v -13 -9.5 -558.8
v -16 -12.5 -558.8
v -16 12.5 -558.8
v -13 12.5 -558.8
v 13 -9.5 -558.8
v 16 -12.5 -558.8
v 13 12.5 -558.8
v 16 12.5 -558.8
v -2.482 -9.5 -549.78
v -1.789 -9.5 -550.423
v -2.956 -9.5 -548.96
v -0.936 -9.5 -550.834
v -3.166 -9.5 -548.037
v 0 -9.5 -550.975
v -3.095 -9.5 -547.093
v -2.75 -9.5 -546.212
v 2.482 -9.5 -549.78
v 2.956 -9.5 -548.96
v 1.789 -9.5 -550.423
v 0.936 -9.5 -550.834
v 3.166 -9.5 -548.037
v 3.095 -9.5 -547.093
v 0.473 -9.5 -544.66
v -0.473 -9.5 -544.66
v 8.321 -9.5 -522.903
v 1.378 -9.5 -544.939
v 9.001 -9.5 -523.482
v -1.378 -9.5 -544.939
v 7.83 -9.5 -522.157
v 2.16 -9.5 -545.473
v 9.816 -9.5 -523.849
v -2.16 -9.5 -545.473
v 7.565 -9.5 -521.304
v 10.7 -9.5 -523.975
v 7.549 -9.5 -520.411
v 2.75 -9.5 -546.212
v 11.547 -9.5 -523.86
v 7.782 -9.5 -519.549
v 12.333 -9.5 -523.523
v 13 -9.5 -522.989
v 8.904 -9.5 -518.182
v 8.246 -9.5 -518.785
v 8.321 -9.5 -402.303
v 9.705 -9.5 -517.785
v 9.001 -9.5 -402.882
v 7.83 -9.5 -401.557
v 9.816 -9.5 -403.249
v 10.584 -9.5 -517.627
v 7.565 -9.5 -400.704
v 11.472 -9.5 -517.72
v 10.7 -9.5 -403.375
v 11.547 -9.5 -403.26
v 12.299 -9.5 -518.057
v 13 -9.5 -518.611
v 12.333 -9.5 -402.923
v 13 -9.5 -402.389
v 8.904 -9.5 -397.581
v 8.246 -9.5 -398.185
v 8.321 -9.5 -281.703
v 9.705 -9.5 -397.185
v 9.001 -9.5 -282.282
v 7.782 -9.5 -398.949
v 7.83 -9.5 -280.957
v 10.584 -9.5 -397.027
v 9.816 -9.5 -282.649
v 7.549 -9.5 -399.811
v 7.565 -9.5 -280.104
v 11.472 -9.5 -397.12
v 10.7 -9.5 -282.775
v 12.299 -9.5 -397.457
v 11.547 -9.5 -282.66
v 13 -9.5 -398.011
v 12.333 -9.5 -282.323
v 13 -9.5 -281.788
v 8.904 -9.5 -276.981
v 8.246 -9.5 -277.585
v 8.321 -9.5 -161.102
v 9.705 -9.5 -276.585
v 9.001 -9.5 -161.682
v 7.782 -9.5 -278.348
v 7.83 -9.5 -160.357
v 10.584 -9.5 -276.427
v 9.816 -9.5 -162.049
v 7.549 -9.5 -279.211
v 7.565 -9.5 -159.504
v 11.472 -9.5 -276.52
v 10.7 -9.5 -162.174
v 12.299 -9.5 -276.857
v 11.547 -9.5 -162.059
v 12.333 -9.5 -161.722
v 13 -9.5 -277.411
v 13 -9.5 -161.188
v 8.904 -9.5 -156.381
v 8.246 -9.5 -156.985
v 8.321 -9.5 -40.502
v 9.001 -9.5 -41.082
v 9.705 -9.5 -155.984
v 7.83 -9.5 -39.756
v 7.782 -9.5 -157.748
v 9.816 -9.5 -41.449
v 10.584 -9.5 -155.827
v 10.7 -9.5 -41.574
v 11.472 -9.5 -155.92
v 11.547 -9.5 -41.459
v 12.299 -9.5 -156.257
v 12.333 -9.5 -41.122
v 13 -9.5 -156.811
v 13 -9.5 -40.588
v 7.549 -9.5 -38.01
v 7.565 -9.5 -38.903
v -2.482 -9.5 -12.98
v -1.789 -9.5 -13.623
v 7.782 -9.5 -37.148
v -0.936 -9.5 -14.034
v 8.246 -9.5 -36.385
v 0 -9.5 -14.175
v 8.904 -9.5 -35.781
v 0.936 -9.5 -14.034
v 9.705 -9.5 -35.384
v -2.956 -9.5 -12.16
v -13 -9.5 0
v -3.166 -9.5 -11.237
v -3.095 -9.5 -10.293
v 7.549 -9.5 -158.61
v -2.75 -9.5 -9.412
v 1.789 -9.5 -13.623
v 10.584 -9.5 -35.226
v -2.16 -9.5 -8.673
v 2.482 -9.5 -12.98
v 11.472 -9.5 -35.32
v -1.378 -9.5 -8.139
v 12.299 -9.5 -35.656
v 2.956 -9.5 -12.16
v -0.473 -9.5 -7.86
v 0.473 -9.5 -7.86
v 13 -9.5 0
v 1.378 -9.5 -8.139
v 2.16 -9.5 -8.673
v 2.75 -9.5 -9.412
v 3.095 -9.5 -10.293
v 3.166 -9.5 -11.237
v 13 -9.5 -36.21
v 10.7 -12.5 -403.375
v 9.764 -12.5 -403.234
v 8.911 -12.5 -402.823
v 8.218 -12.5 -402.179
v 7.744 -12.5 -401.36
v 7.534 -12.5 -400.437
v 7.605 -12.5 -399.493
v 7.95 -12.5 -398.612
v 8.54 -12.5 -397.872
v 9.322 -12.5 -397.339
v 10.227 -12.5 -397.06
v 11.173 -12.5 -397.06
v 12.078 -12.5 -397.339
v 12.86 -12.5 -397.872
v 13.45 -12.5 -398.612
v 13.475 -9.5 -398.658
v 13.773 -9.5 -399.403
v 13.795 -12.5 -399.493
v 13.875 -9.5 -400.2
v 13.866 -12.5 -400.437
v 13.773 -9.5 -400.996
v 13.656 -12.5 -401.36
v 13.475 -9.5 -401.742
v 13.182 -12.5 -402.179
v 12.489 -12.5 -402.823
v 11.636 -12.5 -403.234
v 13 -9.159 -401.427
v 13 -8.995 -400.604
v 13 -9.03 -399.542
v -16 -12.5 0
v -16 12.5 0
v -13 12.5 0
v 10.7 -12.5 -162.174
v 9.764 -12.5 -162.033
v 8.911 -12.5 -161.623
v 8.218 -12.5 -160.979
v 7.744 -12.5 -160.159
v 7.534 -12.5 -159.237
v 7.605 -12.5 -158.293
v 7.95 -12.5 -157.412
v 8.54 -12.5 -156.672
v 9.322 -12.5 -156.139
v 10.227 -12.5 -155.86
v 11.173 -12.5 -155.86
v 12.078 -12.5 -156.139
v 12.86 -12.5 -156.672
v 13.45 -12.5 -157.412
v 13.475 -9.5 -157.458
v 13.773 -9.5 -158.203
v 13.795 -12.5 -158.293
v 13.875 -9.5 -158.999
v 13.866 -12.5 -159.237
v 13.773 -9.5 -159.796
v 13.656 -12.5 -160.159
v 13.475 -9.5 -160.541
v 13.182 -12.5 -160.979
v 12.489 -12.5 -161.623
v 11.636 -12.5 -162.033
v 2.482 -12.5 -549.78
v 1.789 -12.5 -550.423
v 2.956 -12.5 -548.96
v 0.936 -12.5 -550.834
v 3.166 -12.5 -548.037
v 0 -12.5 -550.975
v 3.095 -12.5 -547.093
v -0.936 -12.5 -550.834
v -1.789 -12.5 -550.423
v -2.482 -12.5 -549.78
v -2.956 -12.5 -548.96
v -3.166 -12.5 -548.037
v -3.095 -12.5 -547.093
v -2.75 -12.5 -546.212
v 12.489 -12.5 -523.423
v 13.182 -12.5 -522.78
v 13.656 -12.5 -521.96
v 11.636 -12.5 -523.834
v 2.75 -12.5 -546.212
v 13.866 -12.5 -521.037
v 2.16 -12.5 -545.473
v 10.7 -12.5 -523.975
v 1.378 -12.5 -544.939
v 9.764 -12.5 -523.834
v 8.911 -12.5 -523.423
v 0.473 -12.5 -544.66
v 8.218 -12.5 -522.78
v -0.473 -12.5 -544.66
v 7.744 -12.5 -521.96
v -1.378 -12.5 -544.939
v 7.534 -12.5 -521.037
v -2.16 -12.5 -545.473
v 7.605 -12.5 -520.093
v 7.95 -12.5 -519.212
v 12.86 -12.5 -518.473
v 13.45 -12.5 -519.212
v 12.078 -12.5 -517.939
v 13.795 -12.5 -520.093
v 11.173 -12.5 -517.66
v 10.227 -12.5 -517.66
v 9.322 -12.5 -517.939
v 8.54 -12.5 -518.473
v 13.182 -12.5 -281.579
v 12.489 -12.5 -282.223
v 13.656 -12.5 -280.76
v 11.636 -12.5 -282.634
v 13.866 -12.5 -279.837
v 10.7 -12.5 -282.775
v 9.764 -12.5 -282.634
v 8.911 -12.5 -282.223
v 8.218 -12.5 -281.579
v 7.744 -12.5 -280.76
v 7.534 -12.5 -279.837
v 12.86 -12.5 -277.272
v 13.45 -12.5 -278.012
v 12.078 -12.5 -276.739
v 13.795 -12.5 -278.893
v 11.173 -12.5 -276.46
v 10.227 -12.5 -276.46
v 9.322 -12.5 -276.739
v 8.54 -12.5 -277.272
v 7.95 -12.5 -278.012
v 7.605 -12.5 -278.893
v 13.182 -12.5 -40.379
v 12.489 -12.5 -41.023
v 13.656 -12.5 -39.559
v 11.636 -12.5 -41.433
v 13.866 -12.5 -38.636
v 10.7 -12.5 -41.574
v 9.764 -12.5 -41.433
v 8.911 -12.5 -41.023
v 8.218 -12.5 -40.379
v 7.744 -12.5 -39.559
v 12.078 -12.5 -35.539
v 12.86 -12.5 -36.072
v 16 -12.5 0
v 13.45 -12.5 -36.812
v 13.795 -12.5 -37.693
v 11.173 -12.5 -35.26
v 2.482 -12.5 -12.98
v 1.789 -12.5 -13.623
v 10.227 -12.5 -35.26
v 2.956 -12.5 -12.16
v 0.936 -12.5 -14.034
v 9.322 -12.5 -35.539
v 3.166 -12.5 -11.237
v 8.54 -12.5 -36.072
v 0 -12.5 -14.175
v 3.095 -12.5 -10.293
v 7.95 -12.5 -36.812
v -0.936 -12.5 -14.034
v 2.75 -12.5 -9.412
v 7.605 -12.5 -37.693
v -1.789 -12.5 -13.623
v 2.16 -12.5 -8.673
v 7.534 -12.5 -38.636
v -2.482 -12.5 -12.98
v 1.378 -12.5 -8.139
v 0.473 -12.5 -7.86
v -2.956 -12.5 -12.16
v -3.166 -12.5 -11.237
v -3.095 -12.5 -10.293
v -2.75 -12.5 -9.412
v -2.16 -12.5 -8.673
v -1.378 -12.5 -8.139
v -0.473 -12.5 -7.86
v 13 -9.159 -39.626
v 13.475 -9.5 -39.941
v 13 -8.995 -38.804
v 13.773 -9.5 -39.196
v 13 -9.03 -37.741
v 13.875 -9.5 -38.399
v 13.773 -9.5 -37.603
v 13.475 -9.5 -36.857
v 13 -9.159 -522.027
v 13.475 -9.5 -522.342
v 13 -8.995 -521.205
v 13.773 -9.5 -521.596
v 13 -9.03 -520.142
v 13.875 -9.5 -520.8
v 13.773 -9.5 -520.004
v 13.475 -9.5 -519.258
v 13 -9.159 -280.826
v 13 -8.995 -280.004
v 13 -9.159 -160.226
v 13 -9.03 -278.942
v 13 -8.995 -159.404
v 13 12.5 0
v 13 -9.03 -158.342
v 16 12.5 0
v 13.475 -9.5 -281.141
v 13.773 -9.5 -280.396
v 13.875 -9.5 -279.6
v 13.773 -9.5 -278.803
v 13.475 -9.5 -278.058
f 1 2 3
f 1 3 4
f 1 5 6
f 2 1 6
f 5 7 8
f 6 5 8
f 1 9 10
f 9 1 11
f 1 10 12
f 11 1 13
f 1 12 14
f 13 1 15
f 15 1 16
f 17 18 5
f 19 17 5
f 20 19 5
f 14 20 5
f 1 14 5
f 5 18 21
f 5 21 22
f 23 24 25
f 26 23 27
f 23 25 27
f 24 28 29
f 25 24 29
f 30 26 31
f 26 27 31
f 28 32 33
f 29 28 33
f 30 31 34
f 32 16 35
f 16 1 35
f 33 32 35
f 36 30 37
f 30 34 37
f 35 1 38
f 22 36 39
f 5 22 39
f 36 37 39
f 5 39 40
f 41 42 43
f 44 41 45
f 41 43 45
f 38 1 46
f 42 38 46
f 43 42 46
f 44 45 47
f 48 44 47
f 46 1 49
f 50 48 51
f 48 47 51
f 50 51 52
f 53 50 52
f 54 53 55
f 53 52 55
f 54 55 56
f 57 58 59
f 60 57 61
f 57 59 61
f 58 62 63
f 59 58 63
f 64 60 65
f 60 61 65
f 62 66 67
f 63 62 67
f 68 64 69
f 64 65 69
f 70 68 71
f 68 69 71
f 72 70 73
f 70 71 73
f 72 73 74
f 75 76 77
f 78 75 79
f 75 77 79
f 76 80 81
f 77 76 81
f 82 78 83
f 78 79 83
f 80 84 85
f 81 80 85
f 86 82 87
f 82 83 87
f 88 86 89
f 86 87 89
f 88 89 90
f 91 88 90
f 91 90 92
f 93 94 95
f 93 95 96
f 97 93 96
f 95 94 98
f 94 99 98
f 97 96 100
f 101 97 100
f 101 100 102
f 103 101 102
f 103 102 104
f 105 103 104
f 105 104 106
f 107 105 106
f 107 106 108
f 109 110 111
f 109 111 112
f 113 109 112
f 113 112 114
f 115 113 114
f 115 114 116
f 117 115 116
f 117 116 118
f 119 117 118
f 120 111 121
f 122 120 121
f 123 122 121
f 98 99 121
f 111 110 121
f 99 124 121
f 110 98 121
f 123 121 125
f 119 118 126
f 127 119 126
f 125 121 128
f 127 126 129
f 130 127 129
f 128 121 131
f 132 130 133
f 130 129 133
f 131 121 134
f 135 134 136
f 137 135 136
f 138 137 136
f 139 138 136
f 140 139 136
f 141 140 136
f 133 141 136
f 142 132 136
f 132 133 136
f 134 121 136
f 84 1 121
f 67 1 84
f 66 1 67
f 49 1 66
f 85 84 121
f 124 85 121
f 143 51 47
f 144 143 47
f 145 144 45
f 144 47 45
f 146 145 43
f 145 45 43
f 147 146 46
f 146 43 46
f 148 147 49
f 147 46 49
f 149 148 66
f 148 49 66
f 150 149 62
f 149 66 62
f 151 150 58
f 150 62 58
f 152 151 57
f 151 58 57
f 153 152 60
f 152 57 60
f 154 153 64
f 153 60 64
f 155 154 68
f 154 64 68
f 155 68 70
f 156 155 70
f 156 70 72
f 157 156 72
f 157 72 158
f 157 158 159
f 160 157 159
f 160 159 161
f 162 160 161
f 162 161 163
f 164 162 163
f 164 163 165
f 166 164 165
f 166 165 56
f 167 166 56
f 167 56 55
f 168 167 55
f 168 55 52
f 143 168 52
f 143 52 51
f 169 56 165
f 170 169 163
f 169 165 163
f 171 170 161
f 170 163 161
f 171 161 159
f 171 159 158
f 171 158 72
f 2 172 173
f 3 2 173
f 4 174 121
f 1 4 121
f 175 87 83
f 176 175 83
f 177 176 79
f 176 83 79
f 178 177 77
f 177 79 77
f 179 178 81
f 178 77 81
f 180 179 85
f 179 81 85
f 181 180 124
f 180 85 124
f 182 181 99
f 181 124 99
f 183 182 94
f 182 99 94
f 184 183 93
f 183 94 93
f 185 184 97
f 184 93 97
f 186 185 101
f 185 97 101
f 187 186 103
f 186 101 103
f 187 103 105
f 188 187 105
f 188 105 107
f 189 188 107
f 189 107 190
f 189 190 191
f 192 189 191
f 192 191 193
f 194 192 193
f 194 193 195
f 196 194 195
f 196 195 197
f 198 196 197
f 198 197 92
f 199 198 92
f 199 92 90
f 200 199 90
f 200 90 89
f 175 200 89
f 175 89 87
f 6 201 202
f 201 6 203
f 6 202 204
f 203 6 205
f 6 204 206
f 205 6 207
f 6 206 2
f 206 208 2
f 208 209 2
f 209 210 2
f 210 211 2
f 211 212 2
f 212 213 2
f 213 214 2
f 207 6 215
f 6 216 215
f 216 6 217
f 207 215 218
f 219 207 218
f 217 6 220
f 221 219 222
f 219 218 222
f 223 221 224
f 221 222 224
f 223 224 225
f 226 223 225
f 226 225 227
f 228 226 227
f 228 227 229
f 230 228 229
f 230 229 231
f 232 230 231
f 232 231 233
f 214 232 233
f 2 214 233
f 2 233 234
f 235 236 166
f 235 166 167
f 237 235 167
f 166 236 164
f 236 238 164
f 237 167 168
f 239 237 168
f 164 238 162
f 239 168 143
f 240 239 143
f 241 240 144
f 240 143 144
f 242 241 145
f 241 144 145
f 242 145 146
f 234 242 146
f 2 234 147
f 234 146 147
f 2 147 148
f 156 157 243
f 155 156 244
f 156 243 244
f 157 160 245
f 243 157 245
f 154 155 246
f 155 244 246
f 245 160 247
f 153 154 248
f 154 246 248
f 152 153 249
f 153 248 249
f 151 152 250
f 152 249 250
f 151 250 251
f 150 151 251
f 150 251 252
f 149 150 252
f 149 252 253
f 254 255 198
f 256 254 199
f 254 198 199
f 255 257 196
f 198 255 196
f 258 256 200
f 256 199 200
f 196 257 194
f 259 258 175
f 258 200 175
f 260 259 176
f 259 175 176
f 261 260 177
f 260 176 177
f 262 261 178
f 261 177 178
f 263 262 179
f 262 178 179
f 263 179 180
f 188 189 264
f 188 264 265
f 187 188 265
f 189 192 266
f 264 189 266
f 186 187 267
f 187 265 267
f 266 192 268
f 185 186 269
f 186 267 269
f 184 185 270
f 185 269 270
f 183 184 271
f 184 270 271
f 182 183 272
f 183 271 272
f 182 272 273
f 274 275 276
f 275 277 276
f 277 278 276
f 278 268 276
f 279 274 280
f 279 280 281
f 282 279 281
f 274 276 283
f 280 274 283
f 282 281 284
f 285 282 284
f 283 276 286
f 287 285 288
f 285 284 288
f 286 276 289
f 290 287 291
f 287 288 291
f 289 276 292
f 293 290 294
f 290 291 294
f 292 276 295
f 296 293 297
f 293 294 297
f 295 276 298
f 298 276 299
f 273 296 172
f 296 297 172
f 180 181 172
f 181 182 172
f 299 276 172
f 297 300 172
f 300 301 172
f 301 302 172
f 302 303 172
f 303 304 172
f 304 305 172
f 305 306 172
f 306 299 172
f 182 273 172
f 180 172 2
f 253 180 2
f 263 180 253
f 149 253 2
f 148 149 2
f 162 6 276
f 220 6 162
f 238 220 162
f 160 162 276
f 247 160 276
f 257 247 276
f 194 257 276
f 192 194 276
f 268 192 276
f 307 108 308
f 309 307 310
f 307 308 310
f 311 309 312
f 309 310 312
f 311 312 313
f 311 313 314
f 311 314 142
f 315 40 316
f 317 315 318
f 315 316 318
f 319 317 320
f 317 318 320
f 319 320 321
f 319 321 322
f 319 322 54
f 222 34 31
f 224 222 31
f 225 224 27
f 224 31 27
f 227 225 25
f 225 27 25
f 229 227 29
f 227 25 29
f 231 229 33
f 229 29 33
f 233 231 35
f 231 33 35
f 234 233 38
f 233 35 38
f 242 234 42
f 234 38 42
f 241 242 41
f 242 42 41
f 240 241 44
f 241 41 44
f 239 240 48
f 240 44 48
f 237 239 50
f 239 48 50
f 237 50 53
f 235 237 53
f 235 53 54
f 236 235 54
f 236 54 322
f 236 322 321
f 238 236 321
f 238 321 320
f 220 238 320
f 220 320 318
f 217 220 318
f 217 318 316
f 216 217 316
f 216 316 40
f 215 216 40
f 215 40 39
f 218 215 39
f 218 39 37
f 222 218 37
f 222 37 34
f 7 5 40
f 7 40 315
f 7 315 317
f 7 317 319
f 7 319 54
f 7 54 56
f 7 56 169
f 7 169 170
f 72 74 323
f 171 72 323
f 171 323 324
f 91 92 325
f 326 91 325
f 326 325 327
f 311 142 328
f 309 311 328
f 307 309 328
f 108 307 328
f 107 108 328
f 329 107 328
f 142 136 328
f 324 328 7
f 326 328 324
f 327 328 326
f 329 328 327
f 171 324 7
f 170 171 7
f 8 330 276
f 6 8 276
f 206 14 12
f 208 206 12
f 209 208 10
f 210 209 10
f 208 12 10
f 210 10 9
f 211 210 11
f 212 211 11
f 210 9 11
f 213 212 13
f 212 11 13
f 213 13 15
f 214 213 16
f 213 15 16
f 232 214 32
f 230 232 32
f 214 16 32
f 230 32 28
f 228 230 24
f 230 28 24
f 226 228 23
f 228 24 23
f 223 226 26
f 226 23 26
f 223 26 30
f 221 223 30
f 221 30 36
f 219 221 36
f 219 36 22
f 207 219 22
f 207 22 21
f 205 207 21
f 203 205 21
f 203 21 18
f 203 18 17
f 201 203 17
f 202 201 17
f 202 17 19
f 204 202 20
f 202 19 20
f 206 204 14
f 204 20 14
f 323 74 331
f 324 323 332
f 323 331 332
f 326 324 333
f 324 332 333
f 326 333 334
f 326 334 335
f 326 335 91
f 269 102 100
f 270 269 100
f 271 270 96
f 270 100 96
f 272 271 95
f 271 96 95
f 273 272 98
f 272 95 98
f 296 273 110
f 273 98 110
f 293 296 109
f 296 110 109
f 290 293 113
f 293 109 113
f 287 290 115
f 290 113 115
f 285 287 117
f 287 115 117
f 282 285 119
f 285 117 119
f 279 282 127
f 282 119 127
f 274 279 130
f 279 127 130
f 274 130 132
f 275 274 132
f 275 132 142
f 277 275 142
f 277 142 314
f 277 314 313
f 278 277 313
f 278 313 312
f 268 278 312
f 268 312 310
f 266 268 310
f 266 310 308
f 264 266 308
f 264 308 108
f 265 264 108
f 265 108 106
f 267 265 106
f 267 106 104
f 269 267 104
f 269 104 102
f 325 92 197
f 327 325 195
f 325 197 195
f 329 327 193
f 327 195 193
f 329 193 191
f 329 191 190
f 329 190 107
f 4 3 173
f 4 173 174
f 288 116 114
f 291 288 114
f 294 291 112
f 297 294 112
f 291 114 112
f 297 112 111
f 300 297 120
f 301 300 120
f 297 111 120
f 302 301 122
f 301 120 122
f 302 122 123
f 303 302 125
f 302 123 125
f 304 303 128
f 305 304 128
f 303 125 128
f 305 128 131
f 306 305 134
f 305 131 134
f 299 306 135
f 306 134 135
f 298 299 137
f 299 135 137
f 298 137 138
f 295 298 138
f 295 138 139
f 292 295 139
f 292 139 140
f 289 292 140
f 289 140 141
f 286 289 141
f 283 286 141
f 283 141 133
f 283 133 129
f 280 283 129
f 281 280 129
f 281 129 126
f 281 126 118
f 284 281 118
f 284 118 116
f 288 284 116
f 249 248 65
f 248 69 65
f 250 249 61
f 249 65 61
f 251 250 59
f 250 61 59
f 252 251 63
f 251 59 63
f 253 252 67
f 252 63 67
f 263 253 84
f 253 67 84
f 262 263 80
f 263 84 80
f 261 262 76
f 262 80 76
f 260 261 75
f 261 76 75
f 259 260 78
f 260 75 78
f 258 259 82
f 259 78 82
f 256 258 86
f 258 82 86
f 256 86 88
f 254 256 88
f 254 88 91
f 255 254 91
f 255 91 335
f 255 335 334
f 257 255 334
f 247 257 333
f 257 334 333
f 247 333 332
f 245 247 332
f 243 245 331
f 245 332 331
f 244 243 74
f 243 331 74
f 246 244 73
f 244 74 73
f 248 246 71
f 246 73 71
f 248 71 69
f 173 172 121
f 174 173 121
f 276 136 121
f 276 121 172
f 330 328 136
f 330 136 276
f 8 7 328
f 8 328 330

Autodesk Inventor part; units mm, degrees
ref_plane "YZ Plane" through (0, 0, 0) normal (1, 0, 0) x (0, 1, 0)
ref_plane "XZ Plane" through (0, 0, 0) normal (0, 1, 0) x (-1, 0, 0)
ref_plane "XY Plane" through (0, 0, 0) normal (0, 0, 1) x (1, 0, 0)
sketch "Sketch1" plane through (0, 0, 0) normal (0, 0, 1) x (1, 0, 0)
  line L0 (-16, 12.5) -> (-13, 12.5)
  line L1 (-13, 12.5) -> (-13, -9.5)
  line L2 (-13, -9.5) -> (13, -9.5)
  line L3 (13, -9.5) -> (13, 12.5)
  line L4 (13, 12.5) -> (16, 12.5)
  line L5 (16, 12.5) -> (16, -12.5)
  line L6 (16, -12.5) -> (-16, -12.5)
  line L7 (-16, -12.5) -> (-16, 12.5)
  point P0 (0, 0)
  dimension "d0" = 3
  dimension "d2" = 3
  dimension "d3" = 25
  dimension "d4" = 32
  dimension "d5" = 16
  dimension "d7" = 12.5
  dimension "d8" = 3
  dimension "d95" = 25
extrude "Extrusion1" add sketch "Sketch1" against normal blind 558.8
sketch "Sketch7" plane through (-16, -12.5, 0) normal (0, -1, 0) x (1, 0, 0)
  line L0 (32, 0) -> (0, 0) projected
  line L1 (32, -558.8) -> (0, -558.8) projected
  line L2 (32, 0) -> (32, -558.8) projected
  circle A0 centre (16, -11) radius 3.175
  circle A1 centre (16, -547.8) radius 3.175
  point P0 (16, 0)
  dimension "d103" = 6.35
  dimension "d104" = 11
  dimension "d105" = 16
  dimension "d106" = 6.35
  dimension "d108" = 16
  dimension "d109" = 11
hole "Hole3" at (0, -12.5, -547.8) at (0, -12.5, -11) direction (0, 1, 0) diameter 6.35 end through all
sketch "Sketch8" plane through (-16, -12.5, 0) normal (0, -1, 0) x (1, 0, 0)
  line L0 (26.7, -35.2242) -> (48.3, -35.2242) construction
  arc A0 (26.7, -276.4246) -> (26.7, -282.7746) centre (26.7, -279.5996) ccw construction
  line L1 (26.7, -276.4246) -> (48.3, -276.4246) construction
  arc A1 (48.3, -282.7746) -> (48.3, -276.4246) centre (48.3, -279.5996) ccw construction
  line L2 (48.3, -282.7746) -> (26.7, -282.7746) construction
  arc A2 (26.7, -155.8244) -> (26.7, -162.1744) centre (26.7, -158.9994) ccw construction
  line L3 (26.7, -155.8244) -> (48.3, -155.8244) construction
  arc A3 (48.3, -162.1744) -> (48.3, -155.8244) centre (48.3, -158.9994) ccw construction
  line L4 (48.3, -162.1744) -> (26.7, -162.1744) construction
  arc A4 (48.3, -523.975) -> (48.3, -517.625) centre (48.3, -520.8) ccw construction
  line L5 (48.3, -523.975) -> (26.7, -523.975) construction
  arc A5 (26.7, -517.625) -> (26.7, -523.975) centre (26.7, -520.8) ccw construction
  line L6 (26.7, -517.625) -> (48.3, -517.625) construction
  arc A6 (26.7, -397.0248) -> (26.7, -403.3748) centre (26.7, -400.1998) ccw construction
  line L7 (26.7, -397.0248) -> (48.3, -397.0248) construction
  arc A7 (48.3, -403.3748) -> (48.3, -397.0248) centre (48.3, -400.1998) ccw construction
  line L8 (48.3, -403.3748) -> (26.7, -403.3748) construction
  arc A8 (48.3, -41.5742) -> (48.3, -35.2242) centre (48.3, -38.3992) ccw construction
  line L9 (48.3, -41.5742) -> (26.7, -41.5742) construction
  arc A9 (26.7, -35.2242) -> (26.7, -41.5742) centre (26.7, -38.3992) ccw construction
  line L10 (26.7, -35.2242) -> (48.3, -35.2242) construction
  line L11 (61, -22.3992) -> (14, -22.3992) construction
  line L12 (14, -22.3992) -> (14, -536.8) construction
  line L13 (61, -536.8) -> (14, -536.8) construction
  line L14 (61, -22.3992) -> (61, -536.8) construction
  circle A10 centre (26.7, -38.3992) radius 3.175
  circle A11 centre (26.7, -158.9994) radius 3.175
  circle A12 centre (26.7, -279.5996) radius 3.175
  circle A13 centre (26.7, -400.1998) radius 3.175
  circle A14 centre (26.7, -520.8) radius 3.175
  point P0 (16, 0)
hole "Hole4" at (10.7, -12.5, -38.3992) at (10.7, -12.5, -158.9994) at (10.7, -12.5, -279.5996) at (10.7, -12.5, -400.1998) at (10.7, -12.5, -520.8) direction (0, 1, 0) diameter 6.35 depth 3 tip angle 118
equation "\"d2\" = d0"
equation "\"d5\" = 0.5 * d4"
equation "\"d7\" = 0.5 * d3"
equation "\"d8\" = d0"
equation "\"d95\" = d3"
properties part number "26in C-Channel Left" material "Aluminum 6061"
